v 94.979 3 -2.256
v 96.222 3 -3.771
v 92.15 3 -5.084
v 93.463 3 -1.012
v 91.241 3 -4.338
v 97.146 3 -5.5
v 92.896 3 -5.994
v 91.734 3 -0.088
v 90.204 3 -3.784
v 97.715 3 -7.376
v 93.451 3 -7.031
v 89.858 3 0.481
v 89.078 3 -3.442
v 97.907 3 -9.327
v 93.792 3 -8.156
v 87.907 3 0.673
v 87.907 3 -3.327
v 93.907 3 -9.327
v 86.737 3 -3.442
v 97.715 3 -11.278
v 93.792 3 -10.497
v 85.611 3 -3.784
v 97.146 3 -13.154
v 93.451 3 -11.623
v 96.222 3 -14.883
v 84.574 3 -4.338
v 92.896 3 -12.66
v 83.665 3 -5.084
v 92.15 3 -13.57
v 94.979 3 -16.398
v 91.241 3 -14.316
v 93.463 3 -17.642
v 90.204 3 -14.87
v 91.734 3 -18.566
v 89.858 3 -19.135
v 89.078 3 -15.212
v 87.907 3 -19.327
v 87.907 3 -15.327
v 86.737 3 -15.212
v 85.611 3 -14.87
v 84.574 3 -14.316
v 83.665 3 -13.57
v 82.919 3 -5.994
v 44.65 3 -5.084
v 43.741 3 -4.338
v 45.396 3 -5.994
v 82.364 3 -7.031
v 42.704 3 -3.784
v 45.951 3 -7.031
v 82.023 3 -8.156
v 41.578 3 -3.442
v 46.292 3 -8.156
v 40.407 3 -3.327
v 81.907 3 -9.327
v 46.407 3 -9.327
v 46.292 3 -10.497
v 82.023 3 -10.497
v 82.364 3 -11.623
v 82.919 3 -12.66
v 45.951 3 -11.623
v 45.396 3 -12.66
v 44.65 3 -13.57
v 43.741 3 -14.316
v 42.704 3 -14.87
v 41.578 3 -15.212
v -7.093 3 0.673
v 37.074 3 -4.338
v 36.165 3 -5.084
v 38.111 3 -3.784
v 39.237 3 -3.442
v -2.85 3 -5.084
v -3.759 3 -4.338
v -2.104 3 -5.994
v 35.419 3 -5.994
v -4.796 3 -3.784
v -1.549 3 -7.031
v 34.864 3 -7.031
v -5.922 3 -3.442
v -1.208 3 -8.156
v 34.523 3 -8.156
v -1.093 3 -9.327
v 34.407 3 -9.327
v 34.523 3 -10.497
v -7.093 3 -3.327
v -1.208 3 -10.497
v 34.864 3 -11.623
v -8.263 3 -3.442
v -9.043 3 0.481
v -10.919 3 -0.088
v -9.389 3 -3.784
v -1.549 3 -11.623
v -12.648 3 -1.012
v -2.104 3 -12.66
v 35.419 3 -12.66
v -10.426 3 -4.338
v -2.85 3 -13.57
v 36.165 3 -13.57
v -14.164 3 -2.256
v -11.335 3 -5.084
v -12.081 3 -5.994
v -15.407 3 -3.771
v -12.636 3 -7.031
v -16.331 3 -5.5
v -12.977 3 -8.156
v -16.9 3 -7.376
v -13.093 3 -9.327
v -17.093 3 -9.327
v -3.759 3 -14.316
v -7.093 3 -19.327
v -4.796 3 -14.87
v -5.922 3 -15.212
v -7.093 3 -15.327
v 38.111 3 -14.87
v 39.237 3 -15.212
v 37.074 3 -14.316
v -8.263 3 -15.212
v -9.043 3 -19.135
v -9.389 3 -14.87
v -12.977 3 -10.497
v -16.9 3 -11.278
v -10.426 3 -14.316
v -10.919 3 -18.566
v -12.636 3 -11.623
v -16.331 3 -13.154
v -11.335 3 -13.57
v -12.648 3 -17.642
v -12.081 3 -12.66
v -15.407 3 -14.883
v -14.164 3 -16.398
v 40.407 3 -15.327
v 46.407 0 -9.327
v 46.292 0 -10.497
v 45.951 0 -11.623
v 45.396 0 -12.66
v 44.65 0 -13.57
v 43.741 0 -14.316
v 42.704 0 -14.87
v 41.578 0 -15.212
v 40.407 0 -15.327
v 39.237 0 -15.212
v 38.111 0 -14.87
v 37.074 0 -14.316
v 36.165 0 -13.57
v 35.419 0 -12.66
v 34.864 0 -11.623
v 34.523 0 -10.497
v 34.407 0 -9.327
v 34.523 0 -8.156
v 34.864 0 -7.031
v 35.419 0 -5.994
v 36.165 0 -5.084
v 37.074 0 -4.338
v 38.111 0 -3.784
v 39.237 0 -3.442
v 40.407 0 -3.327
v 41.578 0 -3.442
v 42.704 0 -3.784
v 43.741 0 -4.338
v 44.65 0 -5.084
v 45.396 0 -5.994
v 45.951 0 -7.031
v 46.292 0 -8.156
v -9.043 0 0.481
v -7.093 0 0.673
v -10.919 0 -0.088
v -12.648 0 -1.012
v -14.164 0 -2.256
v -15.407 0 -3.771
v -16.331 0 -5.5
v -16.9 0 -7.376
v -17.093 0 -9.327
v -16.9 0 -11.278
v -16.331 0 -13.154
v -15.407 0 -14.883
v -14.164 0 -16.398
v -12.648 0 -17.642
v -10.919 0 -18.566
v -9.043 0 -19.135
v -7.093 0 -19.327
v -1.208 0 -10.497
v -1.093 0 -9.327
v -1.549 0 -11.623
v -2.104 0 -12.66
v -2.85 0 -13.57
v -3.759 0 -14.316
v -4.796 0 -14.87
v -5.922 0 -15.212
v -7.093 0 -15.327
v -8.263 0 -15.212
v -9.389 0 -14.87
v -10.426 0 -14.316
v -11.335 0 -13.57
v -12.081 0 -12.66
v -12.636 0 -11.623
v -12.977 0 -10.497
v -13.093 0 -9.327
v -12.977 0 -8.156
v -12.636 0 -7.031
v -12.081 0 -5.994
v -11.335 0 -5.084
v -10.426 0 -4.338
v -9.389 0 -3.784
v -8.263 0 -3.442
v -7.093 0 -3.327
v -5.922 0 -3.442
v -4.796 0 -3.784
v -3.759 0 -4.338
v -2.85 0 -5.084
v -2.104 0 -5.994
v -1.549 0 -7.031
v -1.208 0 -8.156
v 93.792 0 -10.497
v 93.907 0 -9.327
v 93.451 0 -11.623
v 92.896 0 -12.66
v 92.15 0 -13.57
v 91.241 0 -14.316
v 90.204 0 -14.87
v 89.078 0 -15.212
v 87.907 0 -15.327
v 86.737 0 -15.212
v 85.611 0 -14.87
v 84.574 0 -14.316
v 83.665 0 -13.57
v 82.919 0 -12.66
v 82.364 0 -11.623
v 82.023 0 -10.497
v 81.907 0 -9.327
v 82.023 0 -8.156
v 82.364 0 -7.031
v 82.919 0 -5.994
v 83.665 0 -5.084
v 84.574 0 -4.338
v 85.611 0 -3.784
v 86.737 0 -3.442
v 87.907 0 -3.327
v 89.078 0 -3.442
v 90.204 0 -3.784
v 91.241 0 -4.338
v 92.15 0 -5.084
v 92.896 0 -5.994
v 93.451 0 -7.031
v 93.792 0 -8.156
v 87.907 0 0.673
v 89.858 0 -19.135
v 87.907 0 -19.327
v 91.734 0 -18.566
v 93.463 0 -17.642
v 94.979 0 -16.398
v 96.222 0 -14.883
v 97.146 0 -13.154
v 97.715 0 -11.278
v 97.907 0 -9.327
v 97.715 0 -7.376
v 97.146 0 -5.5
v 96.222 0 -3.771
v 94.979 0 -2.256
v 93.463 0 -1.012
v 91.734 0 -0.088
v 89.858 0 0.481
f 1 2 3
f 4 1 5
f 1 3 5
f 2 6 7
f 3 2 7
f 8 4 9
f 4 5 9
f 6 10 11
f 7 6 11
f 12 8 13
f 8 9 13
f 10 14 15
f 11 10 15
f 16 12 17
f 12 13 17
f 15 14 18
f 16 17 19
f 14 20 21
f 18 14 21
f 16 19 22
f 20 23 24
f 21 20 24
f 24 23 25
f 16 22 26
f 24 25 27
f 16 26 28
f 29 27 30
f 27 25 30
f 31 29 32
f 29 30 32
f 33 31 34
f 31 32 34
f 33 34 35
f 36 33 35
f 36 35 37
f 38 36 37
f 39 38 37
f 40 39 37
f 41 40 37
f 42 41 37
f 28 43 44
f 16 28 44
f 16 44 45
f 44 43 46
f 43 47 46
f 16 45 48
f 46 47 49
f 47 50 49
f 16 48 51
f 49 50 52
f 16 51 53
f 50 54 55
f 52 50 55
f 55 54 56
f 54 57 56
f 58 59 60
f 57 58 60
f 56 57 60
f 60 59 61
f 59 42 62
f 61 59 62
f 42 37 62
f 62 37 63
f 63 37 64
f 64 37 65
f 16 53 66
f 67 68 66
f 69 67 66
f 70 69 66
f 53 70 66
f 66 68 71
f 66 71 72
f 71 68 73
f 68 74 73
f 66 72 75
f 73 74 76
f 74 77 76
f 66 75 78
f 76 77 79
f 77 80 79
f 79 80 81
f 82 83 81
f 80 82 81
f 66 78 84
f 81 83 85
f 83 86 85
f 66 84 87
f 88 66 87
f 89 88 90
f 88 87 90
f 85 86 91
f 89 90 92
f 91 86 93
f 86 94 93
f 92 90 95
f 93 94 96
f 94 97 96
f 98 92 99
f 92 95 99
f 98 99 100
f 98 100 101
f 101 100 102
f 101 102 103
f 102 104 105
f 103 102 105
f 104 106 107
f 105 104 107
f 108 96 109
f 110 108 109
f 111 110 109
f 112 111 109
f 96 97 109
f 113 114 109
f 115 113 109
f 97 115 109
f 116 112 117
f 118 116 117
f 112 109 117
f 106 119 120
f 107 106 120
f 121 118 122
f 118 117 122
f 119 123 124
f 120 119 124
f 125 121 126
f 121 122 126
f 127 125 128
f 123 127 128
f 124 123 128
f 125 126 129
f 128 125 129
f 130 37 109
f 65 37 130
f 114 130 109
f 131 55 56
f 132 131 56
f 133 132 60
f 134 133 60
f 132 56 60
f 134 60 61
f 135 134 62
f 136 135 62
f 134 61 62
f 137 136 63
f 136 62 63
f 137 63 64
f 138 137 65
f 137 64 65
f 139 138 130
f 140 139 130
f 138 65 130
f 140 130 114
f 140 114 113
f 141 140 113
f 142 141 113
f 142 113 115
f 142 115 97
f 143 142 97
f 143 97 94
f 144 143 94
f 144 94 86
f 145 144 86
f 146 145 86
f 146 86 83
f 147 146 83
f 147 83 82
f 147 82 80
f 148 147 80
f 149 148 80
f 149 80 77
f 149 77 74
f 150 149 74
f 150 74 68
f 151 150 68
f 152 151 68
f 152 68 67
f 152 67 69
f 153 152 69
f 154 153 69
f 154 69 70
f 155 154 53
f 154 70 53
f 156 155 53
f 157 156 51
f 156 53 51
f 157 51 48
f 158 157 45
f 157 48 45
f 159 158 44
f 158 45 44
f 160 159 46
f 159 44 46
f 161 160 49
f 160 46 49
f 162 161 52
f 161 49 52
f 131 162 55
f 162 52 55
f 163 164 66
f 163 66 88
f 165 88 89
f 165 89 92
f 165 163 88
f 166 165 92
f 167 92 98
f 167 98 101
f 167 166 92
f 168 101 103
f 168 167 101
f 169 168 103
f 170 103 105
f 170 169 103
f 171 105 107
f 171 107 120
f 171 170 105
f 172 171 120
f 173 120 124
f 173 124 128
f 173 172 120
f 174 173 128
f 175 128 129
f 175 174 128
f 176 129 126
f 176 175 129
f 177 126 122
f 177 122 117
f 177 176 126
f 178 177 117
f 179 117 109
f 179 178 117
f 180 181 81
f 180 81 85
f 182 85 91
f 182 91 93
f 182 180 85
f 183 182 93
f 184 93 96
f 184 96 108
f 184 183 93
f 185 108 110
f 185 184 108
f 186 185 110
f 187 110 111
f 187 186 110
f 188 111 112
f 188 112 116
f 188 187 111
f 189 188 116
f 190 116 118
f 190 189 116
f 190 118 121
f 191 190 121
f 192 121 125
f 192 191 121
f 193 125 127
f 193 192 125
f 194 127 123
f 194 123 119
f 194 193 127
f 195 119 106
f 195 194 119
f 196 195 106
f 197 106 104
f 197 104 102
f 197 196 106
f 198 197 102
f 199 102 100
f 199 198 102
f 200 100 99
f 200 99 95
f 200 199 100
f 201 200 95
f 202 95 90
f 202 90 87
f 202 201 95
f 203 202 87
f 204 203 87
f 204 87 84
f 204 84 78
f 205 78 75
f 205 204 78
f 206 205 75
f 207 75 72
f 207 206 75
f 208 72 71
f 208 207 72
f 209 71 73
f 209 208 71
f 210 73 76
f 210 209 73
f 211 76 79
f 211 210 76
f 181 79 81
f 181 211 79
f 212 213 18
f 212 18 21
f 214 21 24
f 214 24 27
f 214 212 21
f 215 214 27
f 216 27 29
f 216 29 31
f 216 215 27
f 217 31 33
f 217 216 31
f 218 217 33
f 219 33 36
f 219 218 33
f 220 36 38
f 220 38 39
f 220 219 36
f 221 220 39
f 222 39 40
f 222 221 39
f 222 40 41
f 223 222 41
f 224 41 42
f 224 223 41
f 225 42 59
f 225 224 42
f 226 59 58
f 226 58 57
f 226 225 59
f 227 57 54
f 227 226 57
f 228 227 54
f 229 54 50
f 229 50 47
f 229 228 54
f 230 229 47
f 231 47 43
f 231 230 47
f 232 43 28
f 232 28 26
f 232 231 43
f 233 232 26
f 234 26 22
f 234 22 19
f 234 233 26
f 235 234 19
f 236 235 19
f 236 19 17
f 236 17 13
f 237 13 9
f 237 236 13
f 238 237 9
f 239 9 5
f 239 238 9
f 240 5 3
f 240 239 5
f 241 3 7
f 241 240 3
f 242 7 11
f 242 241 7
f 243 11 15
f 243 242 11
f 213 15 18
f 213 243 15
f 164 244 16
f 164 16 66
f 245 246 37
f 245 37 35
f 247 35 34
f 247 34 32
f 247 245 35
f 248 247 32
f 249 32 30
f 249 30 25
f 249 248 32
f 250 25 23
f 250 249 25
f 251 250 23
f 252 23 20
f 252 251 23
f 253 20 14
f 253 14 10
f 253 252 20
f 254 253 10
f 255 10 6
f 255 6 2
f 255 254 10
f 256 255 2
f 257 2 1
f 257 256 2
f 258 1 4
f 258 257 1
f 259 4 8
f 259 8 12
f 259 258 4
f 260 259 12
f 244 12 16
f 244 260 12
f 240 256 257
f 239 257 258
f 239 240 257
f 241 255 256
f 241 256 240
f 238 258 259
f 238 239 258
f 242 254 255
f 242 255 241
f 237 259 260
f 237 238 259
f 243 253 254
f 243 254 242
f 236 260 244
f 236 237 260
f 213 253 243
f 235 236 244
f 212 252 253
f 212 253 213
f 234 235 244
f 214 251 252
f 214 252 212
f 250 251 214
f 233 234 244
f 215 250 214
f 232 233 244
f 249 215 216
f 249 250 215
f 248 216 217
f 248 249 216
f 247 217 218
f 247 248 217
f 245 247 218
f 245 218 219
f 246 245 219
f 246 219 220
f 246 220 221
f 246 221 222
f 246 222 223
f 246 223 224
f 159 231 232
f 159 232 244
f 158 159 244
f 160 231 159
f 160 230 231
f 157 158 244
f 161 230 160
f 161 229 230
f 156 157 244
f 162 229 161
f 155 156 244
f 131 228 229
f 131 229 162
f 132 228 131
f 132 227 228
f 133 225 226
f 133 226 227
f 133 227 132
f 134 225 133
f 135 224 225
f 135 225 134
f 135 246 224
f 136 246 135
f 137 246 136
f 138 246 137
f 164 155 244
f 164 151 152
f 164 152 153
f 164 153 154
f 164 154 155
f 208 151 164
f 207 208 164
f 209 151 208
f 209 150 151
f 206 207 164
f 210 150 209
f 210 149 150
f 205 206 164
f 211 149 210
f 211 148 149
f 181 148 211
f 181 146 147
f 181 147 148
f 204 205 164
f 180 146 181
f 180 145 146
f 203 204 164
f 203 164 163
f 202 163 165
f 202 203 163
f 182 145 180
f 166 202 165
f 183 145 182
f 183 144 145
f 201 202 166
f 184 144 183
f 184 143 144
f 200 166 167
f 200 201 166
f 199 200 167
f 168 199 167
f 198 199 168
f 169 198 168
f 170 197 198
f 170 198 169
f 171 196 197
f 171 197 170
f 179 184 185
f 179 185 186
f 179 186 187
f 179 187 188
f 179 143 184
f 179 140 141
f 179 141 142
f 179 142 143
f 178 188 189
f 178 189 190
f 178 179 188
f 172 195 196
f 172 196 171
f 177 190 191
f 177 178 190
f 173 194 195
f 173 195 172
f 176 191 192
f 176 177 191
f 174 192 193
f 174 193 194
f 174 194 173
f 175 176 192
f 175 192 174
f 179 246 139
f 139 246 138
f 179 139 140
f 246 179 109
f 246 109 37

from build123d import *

# Parameters (mm, degrees)
SKETCH1_R           = 6
BOSS_EXTRUDE1_DEPTH = 3
SKETCH2_R           = 6
CUT_EXTRUDE1_DEPTH  = 4


with BuildPart() as part:
    # Sketch1 → Boss-Extrude1 (new body)
    with BuildSketch(Plane(origin=(0, 0, 0), x_dir=(1, 0, 0), z_dir=(0, 1, 0))):
        with BuildLine():
            Line((-7.092556659, 19.326923077), (87.907443341, 19.326923077))
            ThreePointArc((87.907443341, 19.326923077), (97.907443341, 9.326923077), (87.907443341, -0.673076923))
            Line((87.907443341, -0.673076923), (-7.092556659, -0.673076923))
            ThreePointArc((-7.092556659, -0.673076923), (-17.092556659, 9.326923077), (-7.092556659, 19.326923077))
        make_face()
        with Locations((-7.092556659, 9.326923077)):
            Circle(SKETCH1_R, mode=Mode.SUBTRACT)
        with Locations((87.907443341, 9.326923077)):
            Circle(SKETCH1_R, mode=Mode.SUBTRACT)
    extrude(amount=BOSS_EXTRUDE1_DEPTH)

    # Sketch2 → Cut-Extrude1 (cut, through all)
    with BuildSketch(Plane(origin=(0, 3, 0), x_dir=(1, 0, 0), z_dir=(0, 1, 0))):
        with Locations((40.407443341, 9.326923077)):
            Circle(SKETCH2_R)
    extrude(amount=-CUT_EXTRUDE1_DEPTH, mode=Mode.SUBTRACT)


solid = part.part
